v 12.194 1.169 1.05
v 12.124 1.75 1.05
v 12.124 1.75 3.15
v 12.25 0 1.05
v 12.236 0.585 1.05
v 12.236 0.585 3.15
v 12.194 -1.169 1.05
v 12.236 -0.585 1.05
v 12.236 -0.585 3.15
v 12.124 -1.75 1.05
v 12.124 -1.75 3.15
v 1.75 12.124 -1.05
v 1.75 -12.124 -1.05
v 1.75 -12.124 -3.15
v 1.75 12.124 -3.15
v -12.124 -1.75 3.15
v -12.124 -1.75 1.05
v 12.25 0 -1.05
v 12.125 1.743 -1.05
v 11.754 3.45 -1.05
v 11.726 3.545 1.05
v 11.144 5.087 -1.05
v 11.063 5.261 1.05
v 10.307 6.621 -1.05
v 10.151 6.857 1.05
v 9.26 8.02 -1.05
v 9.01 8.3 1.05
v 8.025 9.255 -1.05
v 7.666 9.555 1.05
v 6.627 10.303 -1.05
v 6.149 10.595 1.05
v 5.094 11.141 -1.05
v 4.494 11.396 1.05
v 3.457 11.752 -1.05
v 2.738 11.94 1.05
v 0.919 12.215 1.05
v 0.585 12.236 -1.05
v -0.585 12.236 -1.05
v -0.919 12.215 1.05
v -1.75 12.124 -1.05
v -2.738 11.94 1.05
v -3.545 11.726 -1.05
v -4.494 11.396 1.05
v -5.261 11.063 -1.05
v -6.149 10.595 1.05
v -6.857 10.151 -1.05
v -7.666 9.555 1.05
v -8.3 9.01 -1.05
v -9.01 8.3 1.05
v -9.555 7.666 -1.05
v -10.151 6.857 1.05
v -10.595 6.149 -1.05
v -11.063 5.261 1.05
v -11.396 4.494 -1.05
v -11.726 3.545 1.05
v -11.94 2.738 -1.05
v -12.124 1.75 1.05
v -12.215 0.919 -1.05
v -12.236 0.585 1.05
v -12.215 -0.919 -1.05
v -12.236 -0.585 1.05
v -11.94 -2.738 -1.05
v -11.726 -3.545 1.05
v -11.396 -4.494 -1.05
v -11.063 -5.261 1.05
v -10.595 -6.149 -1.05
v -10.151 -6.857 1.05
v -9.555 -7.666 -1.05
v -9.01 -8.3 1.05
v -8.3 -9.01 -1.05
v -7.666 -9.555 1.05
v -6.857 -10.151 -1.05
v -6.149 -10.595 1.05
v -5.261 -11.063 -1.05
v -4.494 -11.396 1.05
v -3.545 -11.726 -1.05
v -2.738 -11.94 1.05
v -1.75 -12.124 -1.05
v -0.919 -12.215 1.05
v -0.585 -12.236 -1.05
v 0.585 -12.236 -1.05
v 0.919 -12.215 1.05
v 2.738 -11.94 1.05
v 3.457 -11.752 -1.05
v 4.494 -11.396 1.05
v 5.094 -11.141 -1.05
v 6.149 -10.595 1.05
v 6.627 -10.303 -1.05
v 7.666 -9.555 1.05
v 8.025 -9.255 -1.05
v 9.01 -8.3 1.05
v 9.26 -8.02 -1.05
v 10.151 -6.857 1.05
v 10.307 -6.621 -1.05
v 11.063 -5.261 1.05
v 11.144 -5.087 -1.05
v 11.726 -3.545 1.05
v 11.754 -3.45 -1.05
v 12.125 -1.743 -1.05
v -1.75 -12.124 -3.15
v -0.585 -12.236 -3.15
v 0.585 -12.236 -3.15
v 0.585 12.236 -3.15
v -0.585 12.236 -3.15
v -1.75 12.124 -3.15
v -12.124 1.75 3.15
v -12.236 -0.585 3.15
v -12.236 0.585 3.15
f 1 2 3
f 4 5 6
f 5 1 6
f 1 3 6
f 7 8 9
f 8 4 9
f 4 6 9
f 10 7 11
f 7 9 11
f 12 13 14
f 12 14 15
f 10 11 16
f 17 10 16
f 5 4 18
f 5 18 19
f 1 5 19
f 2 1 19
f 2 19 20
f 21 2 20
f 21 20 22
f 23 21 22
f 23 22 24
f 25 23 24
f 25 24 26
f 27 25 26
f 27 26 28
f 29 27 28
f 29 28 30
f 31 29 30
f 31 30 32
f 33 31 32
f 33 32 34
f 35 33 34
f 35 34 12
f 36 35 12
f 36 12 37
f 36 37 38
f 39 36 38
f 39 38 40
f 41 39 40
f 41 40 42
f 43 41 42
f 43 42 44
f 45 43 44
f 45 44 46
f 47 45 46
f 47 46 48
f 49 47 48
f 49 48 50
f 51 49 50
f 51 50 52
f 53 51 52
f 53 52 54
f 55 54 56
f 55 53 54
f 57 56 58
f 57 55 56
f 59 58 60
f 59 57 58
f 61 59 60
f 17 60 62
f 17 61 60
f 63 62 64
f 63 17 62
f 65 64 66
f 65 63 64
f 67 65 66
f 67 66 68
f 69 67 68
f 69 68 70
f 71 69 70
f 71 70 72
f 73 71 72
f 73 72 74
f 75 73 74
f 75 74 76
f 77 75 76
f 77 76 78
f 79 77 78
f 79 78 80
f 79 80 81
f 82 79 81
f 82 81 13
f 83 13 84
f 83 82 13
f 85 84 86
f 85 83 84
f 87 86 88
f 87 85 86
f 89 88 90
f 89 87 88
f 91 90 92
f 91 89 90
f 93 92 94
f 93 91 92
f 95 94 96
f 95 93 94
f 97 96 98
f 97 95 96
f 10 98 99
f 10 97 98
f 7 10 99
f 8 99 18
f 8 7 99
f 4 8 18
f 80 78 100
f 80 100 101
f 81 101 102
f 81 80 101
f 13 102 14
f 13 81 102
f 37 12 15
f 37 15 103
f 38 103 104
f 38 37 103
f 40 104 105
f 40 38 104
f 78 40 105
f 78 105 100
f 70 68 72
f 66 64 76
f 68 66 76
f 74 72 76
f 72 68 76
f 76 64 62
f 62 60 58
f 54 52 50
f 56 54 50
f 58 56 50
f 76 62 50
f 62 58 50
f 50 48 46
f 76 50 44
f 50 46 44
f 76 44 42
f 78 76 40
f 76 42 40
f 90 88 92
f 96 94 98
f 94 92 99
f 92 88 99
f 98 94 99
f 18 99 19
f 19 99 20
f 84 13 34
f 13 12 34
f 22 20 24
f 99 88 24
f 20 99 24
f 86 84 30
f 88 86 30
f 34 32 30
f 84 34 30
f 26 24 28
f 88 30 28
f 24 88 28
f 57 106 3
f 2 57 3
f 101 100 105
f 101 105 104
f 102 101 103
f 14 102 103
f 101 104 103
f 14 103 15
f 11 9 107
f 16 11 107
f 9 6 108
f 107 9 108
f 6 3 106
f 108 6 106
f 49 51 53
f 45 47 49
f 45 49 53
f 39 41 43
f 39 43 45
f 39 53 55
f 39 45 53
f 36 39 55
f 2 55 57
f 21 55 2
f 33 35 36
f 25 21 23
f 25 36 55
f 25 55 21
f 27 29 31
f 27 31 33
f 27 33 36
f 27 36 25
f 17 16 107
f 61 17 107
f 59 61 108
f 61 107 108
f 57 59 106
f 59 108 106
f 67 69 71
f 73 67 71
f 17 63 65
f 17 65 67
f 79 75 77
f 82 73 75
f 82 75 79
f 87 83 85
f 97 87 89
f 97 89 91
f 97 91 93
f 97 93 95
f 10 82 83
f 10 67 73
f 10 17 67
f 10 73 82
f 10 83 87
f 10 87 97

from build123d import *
from build123d.topology import SkipClean

# Parameters (mm, degrees)
SKETCH1_R           = 12.25
BOSS_EXTRUDE1_DEPTH = 1.05
BOSS_EXTRUDE2_START = 2.1
BOSS_EXTRUDE2_DEPTH = 2.1
BOSS_EXTRUDE3_DEPTH = 2.1


with BuildPart() as part:
    # Sketch1 → Boss-Extrude1 (new, symmetric)
    with BuildSketch(Plane.XY):
        Circle(SKETCH1_R)
    extrude(amount=BOSS_EXTRUDE1_DEPTH, both=True)

    # Sketch2 → Boss-Extrude2 (add)
    with SkipClean():  # the faces are left unmerged after this step: merging them gives an invalid solid
        with BuildSketch(Plane.XY.offset(1.05).offset(BOSS_EXTRUDE2_START)):
            with BuildLine():
                Line((-12.124355653, 1.75), (12.124355653, 1.75))
                ThreePointArc((12.124355653, 1.75), (12.25, 0), (12.124355653, -1.75))
                Line((12.124355653, -1.75), (-12.124355653, -1.75))
                ThreePointArc((-12.124355653, -1.75), (-12.25, 0), (-12.124355653, 1.75))
            make_face()
        extrude(amount=-BOSS_EXTRUDE2_DEPTH)

    # Sketch3 → Boss-Extrude3 (add)
    with SkipClean():  # the faces are left unmerged after this step: merging them gives an invalid solid
        with BuildSketch(Plane(origin=(0, 0, -1.05), x_dir=(-1, 0, 0), z_dir=(0, 0, -1))):
            with BuildLine():
                Line((-1.75, -12.124355653), (-1.75, 12.124355653))
                ThreePointArc((-1.75, 12.124355653), (0, 12.25), (1.75, 12.124355653))
                Line((1.75, 12.124355653), (1.75, -12.124355653))
                ThreePointArc((1.75, -12.124355653), (0, -12.25), (-1.75, -12.124355653))
            make_face()
        extrude(amount=BOSS_EXTRUDE3_DEPTH)


solid = part.part
